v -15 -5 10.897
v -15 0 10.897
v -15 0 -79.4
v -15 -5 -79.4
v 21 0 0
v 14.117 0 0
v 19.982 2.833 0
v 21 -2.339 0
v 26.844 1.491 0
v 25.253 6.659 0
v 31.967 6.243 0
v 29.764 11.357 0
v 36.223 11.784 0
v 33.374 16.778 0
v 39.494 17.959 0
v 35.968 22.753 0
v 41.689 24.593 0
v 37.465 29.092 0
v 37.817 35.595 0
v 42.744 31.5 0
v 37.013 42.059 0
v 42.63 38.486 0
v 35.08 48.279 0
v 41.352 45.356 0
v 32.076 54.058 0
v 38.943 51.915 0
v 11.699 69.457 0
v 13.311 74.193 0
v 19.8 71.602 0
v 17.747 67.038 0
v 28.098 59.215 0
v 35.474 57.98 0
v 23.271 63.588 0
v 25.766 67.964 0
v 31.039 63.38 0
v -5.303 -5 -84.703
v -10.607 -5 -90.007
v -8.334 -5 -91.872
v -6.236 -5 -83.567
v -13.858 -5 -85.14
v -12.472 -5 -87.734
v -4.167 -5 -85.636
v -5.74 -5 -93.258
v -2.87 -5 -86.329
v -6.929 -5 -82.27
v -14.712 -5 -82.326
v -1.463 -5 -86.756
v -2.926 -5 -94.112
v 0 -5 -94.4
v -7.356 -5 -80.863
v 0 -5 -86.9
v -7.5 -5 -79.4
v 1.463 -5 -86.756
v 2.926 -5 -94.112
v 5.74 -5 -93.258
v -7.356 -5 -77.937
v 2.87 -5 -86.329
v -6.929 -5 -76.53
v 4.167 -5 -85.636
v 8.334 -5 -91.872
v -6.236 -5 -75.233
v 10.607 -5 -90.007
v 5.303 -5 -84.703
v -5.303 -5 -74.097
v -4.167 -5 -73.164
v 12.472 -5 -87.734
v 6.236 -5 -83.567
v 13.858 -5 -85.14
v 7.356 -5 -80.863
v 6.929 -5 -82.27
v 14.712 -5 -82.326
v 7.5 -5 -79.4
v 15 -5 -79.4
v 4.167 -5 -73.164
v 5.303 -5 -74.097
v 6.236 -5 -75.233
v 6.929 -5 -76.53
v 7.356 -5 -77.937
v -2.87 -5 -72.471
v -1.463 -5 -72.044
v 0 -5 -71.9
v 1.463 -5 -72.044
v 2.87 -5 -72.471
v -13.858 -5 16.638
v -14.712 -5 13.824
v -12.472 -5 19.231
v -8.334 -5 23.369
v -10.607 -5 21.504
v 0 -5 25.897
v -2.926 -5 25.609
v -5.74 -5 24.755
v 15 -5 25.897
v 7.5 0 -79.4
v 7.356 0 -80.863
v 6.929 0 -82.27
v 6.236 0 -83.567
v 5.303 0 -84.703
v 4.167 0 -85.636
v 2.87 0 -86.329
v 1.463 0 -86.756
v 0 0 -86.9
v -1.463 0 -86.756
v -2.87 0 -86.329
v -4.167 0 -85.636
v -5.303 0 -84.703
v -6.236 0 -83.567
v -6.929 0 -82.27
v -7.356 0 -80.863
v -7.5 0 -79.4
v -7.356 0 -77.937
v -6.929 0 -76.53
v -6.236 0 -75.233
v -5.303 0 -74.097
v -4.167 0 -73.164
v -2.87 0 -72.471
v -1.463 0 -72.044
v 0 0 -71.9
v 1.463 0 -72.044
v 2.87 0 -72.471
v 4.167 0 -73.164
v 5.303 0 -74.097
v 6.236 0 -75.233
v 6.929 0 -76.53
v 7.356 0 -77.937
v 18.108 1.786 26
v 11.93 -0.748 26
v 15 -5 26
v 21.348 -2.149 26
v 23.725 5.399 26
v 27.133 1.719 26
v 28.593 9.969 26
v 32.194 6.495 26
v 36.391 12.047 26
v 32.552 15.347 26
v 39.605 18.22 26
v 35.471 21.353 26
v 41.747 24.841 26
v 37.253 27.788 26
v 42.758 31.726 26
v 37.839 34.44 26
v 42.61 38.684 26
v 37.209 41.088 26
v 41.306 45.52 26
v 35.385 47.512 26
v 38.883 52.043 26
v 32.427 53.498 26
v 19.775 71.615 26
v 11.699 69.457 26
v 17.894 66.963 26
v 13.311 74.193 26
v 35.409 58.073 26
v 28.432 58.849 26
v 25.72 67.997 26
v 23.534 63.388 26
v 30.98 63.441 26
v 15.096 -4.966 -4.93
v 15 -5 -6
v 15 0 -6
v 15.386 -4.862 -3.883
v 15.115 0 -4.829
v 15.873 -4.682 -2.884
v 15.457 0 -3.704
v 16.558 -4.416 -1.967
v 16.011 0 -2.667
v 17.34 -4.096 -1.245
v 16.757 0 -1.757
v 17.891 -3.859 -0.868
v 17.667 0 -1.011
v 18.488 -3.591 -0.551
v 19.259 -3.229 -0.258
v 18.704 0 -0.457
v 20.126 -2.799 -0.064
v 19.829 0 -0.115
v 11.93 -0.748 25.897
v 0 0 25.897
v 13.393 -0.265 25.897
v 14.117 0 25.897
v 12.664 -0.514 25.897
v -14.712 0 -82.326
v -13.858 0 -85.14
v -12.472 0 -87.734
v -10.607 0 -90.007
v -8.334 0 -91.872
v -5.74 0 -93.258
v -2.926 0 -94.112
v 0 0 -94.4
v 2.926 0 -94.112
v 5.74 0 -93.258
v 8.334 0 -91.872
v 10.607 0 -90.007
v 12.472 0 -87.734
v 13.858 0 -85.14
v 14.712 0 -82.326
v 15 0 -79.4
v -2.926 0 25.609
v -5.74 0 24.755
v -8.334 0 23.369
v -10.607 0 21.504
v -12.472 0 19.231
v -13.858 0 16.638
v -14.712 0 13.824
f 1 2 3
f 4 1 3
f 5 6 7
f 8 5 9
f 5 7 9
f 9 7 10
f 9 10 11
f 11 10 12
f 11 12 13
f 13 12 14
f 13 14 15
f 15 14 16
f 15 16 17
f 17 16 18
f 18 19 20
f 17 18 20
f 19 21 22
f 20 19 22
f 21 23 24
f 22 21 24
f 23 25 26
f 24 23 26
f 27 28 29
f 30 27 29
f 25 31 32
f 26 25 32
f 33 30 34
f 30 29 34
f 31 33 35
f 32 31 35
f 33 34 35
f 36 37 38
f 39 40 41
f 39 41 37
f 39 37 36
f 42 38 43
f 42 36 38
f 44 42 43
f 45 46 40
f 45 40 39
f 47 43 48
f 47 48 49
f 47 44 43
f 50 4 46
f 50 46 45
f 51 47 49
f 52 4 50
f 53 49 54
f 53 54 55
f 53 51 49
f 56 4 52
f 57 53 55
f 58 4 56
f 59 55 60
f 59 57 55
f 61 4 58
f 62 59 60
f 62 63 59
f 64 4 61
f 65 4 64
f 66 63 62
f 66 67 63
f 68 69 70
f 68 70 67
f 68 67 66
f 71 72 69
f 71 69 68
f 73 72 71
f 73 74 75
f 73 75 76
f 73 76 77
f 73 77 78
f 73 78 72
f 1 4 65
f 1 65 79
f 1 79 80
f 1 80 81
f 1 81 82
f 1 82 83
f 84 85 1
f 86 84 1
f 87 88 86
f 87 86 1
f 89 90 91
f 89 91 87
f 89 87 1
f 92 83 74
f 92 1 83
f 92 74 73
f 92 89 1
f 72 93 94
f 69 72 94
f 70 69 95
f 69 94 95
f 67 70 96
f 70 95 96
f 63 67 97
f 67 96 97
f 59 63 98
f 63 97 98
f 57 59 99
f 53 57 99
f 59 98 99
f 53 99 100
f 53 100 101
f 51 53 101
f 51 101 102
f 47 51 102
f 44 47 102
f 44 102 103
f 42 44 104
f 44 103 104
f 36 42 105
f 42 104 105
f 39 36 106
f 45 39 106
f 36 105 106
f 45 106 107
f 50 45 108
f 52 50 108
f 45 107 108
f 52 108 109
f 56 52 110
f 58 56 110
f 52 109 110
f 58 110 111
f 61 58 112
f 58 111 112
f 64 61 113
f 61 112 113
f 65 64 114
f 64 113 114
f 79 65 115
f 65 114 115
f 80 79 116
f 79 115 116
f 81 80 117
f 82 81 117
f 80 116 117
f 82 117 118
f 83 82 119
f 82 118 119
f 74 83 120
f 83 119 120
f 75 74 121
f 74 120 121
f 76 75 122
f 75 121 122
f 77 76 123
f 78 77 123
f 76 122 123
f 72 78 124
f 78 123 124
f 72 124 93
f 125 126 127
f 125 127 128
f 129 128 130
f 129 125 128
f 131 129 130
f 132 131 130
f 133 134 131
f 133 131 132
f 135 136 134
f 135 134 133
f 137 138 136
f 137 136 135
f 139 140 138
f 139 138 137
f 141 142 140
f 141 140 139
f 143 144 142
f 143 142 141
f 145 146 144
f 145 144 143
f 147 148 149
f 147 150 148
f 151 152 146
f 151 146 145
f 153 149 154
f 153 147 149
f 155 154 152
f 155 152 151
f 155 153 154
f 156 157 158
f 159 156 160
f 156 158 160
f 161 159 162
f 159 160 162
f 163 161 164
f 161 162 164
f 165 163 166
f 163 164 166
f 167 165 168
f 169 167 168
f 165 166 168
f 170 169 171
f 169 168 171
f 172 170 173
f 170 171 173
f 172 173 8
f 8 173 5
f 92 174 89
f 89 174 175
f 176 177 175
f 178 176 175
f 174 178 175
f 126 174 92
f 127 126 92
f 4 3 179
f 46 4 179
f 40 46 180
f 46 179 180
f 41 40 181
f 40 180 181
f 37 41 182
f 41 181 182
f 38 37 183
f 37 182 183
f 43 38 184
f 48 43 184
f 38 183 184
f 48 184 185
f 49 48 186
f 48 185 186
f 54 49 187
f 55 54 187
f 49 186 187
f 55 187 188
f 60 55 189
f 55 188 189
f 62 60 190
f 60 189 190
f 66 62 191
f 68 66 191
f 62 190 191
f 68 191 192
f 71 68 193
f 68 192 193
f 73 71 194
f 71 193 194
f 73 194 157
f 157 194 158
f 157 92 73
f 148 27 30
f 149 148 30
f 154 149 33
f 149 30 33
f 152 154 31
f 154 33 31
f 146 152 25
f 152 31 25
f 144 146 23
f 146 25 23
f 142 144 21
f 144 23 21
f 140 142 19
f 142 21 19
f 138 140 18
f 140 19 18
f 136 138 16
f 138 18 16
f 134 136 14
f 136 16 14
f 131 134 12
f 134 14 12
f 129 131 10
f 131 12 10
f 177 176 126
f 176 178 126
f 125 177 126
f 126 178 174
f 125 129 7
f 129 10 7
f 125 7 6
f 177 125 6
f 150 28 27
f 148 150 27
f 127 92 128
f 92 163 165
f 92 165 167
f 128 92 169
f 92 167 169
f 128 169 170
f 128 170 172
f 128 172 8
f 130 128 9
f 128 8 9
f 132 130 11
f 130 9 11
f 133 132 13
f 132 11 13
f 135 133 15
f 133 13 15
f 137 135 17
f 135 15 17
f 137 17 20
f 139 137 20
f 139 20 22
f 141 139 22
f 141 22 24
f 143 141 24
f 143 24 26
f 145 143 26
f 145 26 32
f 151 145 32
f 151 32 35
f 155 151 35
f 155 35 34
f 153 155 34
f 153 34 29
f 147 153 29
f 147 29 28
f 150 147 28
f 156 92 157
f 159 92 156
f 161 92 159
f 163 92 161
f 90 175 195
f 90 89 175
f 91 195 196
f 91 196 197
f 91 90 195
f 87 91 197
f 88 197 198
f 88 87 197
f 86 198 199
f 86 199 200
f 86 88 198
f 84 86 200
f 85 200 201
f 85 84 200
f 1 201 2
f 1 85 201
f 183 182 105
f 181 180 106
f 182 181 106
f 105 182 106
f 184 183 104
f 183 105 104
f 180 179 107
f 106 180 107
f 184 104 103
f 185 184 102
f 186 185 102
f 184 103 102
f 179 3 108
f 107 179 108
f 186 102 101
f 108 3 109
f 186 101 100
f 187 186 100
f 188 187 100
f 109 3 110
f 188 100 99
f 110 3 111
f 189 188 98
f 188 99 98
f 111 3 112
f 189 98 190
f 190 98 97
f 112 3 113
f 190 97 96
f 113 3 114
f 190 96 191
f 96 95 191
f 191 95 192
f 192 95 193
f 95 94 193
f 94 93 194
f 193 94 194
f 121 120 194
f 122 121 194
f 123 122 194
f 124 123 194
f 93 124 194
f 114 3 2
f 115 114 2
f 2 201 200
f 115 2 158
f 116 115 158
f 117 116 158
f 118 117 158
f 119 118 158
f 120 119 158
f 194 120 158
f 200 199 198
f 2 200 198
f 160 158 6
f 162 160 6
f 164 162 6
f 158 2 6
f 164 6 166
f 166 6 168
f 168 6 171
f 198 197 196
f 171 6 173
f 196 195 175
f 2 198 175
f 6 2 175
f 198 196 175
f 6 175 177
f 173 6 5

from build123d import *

# Parameters (mm, degrees)
F1_DEPTH = 5
F3_DEPTH = 26
F4_R     = 15
F5_R     = 6


with BuildPart() as f1:
    # F0 (on Front) → F1 (new body)
    with BuildSketch(Plane.XZ):
        with BuildLine():
            Line((15.0000003353, -79.3999582529), (15.0000003353, 25.8973006904))
            Line((15.0000003353, 25.8973006904), (-14.9999996647, 25.8973006904))
            Line((-14.9999996647, 25.8973006904), (-14.9999996647, -79.3999582529))
            ThreePointArc((-14.9999996647, -79.3999582529), (3.353e-07, -64.3999582529), (15.0000003353, -79.3999582529))
        make_face()
        with BuildLine():
            ThreePointArc((-14.9999996647, -79.3999582529), (3.353e-07, -94.3999582529), (15.0000003353, -79.3999582529))
            Line((15.0000003353, -79.3999582529), (7.5000003353, -79.3999582529))
            ThreePointArc((7.5000003353, -79.3999582529), (3.353e-07, -86.8999582529), (-7.4999996647, -79.3999582529))
            Line((-7.4999996647, -79.3999582529), (-14.9999996647, -79.3999582529))
        make_face()
        with BuildLine():
            Line((7.5000003353, -79.3999582529), (15.0000003353, -79.3999582529))
            ThreePointArc((15.0000003353, -79.3999582529), (3.353e-07, -64.3999582529), (-14.9999996647, -79.3999582529))
            Line((-14.9999996647, -79.3999582529), (-7.4999996647, -79.3999582529))
            ThreePointArc((-7.4999996647, -79.3999582529), (3.353e-07, -71.8999582529), (7.5000003353, -79.3999582529))
        make_face()
    extrude(amount=F1_DEPTH)

    # F2 (on Top) → F3 (join)
    with BuildSketch(Plane.XY):
        with BuildLine():
            ThreePointArc((11.6990586319, 69.4567795833), (37.8389339862, 34.4401238089), (11.9304887253, -0.7481090158))
            Line((11.9304887253, -0.7481090158), (14.999749139, -4.999996163))
            ThreePointArc((14.999749139, -4.999996163), (42.8296580573, 35.2079426128), (13.3109600907, 74.1929223018))
            Line((13.3109600907, 74.1929223018), (11.6990586319, 69.4567795833))
        make_face()
    extrude(amount=F3_DEPTH)

    # F4
    f4_edges = [f1.edges().sort_by_distance(p)[0] for p in [
        (-15, -2.5, 25.897301),
    ]]
    fillet(f4_edges, radius=F4_R)

    # F5
    f5_edges = [f1.edges().sort_by_distance(p)[0] for p in [
        (15, -2.499954, 0),
    ]]
    fillet(f5_edges, radius=F5_R)


solid = f1.part
